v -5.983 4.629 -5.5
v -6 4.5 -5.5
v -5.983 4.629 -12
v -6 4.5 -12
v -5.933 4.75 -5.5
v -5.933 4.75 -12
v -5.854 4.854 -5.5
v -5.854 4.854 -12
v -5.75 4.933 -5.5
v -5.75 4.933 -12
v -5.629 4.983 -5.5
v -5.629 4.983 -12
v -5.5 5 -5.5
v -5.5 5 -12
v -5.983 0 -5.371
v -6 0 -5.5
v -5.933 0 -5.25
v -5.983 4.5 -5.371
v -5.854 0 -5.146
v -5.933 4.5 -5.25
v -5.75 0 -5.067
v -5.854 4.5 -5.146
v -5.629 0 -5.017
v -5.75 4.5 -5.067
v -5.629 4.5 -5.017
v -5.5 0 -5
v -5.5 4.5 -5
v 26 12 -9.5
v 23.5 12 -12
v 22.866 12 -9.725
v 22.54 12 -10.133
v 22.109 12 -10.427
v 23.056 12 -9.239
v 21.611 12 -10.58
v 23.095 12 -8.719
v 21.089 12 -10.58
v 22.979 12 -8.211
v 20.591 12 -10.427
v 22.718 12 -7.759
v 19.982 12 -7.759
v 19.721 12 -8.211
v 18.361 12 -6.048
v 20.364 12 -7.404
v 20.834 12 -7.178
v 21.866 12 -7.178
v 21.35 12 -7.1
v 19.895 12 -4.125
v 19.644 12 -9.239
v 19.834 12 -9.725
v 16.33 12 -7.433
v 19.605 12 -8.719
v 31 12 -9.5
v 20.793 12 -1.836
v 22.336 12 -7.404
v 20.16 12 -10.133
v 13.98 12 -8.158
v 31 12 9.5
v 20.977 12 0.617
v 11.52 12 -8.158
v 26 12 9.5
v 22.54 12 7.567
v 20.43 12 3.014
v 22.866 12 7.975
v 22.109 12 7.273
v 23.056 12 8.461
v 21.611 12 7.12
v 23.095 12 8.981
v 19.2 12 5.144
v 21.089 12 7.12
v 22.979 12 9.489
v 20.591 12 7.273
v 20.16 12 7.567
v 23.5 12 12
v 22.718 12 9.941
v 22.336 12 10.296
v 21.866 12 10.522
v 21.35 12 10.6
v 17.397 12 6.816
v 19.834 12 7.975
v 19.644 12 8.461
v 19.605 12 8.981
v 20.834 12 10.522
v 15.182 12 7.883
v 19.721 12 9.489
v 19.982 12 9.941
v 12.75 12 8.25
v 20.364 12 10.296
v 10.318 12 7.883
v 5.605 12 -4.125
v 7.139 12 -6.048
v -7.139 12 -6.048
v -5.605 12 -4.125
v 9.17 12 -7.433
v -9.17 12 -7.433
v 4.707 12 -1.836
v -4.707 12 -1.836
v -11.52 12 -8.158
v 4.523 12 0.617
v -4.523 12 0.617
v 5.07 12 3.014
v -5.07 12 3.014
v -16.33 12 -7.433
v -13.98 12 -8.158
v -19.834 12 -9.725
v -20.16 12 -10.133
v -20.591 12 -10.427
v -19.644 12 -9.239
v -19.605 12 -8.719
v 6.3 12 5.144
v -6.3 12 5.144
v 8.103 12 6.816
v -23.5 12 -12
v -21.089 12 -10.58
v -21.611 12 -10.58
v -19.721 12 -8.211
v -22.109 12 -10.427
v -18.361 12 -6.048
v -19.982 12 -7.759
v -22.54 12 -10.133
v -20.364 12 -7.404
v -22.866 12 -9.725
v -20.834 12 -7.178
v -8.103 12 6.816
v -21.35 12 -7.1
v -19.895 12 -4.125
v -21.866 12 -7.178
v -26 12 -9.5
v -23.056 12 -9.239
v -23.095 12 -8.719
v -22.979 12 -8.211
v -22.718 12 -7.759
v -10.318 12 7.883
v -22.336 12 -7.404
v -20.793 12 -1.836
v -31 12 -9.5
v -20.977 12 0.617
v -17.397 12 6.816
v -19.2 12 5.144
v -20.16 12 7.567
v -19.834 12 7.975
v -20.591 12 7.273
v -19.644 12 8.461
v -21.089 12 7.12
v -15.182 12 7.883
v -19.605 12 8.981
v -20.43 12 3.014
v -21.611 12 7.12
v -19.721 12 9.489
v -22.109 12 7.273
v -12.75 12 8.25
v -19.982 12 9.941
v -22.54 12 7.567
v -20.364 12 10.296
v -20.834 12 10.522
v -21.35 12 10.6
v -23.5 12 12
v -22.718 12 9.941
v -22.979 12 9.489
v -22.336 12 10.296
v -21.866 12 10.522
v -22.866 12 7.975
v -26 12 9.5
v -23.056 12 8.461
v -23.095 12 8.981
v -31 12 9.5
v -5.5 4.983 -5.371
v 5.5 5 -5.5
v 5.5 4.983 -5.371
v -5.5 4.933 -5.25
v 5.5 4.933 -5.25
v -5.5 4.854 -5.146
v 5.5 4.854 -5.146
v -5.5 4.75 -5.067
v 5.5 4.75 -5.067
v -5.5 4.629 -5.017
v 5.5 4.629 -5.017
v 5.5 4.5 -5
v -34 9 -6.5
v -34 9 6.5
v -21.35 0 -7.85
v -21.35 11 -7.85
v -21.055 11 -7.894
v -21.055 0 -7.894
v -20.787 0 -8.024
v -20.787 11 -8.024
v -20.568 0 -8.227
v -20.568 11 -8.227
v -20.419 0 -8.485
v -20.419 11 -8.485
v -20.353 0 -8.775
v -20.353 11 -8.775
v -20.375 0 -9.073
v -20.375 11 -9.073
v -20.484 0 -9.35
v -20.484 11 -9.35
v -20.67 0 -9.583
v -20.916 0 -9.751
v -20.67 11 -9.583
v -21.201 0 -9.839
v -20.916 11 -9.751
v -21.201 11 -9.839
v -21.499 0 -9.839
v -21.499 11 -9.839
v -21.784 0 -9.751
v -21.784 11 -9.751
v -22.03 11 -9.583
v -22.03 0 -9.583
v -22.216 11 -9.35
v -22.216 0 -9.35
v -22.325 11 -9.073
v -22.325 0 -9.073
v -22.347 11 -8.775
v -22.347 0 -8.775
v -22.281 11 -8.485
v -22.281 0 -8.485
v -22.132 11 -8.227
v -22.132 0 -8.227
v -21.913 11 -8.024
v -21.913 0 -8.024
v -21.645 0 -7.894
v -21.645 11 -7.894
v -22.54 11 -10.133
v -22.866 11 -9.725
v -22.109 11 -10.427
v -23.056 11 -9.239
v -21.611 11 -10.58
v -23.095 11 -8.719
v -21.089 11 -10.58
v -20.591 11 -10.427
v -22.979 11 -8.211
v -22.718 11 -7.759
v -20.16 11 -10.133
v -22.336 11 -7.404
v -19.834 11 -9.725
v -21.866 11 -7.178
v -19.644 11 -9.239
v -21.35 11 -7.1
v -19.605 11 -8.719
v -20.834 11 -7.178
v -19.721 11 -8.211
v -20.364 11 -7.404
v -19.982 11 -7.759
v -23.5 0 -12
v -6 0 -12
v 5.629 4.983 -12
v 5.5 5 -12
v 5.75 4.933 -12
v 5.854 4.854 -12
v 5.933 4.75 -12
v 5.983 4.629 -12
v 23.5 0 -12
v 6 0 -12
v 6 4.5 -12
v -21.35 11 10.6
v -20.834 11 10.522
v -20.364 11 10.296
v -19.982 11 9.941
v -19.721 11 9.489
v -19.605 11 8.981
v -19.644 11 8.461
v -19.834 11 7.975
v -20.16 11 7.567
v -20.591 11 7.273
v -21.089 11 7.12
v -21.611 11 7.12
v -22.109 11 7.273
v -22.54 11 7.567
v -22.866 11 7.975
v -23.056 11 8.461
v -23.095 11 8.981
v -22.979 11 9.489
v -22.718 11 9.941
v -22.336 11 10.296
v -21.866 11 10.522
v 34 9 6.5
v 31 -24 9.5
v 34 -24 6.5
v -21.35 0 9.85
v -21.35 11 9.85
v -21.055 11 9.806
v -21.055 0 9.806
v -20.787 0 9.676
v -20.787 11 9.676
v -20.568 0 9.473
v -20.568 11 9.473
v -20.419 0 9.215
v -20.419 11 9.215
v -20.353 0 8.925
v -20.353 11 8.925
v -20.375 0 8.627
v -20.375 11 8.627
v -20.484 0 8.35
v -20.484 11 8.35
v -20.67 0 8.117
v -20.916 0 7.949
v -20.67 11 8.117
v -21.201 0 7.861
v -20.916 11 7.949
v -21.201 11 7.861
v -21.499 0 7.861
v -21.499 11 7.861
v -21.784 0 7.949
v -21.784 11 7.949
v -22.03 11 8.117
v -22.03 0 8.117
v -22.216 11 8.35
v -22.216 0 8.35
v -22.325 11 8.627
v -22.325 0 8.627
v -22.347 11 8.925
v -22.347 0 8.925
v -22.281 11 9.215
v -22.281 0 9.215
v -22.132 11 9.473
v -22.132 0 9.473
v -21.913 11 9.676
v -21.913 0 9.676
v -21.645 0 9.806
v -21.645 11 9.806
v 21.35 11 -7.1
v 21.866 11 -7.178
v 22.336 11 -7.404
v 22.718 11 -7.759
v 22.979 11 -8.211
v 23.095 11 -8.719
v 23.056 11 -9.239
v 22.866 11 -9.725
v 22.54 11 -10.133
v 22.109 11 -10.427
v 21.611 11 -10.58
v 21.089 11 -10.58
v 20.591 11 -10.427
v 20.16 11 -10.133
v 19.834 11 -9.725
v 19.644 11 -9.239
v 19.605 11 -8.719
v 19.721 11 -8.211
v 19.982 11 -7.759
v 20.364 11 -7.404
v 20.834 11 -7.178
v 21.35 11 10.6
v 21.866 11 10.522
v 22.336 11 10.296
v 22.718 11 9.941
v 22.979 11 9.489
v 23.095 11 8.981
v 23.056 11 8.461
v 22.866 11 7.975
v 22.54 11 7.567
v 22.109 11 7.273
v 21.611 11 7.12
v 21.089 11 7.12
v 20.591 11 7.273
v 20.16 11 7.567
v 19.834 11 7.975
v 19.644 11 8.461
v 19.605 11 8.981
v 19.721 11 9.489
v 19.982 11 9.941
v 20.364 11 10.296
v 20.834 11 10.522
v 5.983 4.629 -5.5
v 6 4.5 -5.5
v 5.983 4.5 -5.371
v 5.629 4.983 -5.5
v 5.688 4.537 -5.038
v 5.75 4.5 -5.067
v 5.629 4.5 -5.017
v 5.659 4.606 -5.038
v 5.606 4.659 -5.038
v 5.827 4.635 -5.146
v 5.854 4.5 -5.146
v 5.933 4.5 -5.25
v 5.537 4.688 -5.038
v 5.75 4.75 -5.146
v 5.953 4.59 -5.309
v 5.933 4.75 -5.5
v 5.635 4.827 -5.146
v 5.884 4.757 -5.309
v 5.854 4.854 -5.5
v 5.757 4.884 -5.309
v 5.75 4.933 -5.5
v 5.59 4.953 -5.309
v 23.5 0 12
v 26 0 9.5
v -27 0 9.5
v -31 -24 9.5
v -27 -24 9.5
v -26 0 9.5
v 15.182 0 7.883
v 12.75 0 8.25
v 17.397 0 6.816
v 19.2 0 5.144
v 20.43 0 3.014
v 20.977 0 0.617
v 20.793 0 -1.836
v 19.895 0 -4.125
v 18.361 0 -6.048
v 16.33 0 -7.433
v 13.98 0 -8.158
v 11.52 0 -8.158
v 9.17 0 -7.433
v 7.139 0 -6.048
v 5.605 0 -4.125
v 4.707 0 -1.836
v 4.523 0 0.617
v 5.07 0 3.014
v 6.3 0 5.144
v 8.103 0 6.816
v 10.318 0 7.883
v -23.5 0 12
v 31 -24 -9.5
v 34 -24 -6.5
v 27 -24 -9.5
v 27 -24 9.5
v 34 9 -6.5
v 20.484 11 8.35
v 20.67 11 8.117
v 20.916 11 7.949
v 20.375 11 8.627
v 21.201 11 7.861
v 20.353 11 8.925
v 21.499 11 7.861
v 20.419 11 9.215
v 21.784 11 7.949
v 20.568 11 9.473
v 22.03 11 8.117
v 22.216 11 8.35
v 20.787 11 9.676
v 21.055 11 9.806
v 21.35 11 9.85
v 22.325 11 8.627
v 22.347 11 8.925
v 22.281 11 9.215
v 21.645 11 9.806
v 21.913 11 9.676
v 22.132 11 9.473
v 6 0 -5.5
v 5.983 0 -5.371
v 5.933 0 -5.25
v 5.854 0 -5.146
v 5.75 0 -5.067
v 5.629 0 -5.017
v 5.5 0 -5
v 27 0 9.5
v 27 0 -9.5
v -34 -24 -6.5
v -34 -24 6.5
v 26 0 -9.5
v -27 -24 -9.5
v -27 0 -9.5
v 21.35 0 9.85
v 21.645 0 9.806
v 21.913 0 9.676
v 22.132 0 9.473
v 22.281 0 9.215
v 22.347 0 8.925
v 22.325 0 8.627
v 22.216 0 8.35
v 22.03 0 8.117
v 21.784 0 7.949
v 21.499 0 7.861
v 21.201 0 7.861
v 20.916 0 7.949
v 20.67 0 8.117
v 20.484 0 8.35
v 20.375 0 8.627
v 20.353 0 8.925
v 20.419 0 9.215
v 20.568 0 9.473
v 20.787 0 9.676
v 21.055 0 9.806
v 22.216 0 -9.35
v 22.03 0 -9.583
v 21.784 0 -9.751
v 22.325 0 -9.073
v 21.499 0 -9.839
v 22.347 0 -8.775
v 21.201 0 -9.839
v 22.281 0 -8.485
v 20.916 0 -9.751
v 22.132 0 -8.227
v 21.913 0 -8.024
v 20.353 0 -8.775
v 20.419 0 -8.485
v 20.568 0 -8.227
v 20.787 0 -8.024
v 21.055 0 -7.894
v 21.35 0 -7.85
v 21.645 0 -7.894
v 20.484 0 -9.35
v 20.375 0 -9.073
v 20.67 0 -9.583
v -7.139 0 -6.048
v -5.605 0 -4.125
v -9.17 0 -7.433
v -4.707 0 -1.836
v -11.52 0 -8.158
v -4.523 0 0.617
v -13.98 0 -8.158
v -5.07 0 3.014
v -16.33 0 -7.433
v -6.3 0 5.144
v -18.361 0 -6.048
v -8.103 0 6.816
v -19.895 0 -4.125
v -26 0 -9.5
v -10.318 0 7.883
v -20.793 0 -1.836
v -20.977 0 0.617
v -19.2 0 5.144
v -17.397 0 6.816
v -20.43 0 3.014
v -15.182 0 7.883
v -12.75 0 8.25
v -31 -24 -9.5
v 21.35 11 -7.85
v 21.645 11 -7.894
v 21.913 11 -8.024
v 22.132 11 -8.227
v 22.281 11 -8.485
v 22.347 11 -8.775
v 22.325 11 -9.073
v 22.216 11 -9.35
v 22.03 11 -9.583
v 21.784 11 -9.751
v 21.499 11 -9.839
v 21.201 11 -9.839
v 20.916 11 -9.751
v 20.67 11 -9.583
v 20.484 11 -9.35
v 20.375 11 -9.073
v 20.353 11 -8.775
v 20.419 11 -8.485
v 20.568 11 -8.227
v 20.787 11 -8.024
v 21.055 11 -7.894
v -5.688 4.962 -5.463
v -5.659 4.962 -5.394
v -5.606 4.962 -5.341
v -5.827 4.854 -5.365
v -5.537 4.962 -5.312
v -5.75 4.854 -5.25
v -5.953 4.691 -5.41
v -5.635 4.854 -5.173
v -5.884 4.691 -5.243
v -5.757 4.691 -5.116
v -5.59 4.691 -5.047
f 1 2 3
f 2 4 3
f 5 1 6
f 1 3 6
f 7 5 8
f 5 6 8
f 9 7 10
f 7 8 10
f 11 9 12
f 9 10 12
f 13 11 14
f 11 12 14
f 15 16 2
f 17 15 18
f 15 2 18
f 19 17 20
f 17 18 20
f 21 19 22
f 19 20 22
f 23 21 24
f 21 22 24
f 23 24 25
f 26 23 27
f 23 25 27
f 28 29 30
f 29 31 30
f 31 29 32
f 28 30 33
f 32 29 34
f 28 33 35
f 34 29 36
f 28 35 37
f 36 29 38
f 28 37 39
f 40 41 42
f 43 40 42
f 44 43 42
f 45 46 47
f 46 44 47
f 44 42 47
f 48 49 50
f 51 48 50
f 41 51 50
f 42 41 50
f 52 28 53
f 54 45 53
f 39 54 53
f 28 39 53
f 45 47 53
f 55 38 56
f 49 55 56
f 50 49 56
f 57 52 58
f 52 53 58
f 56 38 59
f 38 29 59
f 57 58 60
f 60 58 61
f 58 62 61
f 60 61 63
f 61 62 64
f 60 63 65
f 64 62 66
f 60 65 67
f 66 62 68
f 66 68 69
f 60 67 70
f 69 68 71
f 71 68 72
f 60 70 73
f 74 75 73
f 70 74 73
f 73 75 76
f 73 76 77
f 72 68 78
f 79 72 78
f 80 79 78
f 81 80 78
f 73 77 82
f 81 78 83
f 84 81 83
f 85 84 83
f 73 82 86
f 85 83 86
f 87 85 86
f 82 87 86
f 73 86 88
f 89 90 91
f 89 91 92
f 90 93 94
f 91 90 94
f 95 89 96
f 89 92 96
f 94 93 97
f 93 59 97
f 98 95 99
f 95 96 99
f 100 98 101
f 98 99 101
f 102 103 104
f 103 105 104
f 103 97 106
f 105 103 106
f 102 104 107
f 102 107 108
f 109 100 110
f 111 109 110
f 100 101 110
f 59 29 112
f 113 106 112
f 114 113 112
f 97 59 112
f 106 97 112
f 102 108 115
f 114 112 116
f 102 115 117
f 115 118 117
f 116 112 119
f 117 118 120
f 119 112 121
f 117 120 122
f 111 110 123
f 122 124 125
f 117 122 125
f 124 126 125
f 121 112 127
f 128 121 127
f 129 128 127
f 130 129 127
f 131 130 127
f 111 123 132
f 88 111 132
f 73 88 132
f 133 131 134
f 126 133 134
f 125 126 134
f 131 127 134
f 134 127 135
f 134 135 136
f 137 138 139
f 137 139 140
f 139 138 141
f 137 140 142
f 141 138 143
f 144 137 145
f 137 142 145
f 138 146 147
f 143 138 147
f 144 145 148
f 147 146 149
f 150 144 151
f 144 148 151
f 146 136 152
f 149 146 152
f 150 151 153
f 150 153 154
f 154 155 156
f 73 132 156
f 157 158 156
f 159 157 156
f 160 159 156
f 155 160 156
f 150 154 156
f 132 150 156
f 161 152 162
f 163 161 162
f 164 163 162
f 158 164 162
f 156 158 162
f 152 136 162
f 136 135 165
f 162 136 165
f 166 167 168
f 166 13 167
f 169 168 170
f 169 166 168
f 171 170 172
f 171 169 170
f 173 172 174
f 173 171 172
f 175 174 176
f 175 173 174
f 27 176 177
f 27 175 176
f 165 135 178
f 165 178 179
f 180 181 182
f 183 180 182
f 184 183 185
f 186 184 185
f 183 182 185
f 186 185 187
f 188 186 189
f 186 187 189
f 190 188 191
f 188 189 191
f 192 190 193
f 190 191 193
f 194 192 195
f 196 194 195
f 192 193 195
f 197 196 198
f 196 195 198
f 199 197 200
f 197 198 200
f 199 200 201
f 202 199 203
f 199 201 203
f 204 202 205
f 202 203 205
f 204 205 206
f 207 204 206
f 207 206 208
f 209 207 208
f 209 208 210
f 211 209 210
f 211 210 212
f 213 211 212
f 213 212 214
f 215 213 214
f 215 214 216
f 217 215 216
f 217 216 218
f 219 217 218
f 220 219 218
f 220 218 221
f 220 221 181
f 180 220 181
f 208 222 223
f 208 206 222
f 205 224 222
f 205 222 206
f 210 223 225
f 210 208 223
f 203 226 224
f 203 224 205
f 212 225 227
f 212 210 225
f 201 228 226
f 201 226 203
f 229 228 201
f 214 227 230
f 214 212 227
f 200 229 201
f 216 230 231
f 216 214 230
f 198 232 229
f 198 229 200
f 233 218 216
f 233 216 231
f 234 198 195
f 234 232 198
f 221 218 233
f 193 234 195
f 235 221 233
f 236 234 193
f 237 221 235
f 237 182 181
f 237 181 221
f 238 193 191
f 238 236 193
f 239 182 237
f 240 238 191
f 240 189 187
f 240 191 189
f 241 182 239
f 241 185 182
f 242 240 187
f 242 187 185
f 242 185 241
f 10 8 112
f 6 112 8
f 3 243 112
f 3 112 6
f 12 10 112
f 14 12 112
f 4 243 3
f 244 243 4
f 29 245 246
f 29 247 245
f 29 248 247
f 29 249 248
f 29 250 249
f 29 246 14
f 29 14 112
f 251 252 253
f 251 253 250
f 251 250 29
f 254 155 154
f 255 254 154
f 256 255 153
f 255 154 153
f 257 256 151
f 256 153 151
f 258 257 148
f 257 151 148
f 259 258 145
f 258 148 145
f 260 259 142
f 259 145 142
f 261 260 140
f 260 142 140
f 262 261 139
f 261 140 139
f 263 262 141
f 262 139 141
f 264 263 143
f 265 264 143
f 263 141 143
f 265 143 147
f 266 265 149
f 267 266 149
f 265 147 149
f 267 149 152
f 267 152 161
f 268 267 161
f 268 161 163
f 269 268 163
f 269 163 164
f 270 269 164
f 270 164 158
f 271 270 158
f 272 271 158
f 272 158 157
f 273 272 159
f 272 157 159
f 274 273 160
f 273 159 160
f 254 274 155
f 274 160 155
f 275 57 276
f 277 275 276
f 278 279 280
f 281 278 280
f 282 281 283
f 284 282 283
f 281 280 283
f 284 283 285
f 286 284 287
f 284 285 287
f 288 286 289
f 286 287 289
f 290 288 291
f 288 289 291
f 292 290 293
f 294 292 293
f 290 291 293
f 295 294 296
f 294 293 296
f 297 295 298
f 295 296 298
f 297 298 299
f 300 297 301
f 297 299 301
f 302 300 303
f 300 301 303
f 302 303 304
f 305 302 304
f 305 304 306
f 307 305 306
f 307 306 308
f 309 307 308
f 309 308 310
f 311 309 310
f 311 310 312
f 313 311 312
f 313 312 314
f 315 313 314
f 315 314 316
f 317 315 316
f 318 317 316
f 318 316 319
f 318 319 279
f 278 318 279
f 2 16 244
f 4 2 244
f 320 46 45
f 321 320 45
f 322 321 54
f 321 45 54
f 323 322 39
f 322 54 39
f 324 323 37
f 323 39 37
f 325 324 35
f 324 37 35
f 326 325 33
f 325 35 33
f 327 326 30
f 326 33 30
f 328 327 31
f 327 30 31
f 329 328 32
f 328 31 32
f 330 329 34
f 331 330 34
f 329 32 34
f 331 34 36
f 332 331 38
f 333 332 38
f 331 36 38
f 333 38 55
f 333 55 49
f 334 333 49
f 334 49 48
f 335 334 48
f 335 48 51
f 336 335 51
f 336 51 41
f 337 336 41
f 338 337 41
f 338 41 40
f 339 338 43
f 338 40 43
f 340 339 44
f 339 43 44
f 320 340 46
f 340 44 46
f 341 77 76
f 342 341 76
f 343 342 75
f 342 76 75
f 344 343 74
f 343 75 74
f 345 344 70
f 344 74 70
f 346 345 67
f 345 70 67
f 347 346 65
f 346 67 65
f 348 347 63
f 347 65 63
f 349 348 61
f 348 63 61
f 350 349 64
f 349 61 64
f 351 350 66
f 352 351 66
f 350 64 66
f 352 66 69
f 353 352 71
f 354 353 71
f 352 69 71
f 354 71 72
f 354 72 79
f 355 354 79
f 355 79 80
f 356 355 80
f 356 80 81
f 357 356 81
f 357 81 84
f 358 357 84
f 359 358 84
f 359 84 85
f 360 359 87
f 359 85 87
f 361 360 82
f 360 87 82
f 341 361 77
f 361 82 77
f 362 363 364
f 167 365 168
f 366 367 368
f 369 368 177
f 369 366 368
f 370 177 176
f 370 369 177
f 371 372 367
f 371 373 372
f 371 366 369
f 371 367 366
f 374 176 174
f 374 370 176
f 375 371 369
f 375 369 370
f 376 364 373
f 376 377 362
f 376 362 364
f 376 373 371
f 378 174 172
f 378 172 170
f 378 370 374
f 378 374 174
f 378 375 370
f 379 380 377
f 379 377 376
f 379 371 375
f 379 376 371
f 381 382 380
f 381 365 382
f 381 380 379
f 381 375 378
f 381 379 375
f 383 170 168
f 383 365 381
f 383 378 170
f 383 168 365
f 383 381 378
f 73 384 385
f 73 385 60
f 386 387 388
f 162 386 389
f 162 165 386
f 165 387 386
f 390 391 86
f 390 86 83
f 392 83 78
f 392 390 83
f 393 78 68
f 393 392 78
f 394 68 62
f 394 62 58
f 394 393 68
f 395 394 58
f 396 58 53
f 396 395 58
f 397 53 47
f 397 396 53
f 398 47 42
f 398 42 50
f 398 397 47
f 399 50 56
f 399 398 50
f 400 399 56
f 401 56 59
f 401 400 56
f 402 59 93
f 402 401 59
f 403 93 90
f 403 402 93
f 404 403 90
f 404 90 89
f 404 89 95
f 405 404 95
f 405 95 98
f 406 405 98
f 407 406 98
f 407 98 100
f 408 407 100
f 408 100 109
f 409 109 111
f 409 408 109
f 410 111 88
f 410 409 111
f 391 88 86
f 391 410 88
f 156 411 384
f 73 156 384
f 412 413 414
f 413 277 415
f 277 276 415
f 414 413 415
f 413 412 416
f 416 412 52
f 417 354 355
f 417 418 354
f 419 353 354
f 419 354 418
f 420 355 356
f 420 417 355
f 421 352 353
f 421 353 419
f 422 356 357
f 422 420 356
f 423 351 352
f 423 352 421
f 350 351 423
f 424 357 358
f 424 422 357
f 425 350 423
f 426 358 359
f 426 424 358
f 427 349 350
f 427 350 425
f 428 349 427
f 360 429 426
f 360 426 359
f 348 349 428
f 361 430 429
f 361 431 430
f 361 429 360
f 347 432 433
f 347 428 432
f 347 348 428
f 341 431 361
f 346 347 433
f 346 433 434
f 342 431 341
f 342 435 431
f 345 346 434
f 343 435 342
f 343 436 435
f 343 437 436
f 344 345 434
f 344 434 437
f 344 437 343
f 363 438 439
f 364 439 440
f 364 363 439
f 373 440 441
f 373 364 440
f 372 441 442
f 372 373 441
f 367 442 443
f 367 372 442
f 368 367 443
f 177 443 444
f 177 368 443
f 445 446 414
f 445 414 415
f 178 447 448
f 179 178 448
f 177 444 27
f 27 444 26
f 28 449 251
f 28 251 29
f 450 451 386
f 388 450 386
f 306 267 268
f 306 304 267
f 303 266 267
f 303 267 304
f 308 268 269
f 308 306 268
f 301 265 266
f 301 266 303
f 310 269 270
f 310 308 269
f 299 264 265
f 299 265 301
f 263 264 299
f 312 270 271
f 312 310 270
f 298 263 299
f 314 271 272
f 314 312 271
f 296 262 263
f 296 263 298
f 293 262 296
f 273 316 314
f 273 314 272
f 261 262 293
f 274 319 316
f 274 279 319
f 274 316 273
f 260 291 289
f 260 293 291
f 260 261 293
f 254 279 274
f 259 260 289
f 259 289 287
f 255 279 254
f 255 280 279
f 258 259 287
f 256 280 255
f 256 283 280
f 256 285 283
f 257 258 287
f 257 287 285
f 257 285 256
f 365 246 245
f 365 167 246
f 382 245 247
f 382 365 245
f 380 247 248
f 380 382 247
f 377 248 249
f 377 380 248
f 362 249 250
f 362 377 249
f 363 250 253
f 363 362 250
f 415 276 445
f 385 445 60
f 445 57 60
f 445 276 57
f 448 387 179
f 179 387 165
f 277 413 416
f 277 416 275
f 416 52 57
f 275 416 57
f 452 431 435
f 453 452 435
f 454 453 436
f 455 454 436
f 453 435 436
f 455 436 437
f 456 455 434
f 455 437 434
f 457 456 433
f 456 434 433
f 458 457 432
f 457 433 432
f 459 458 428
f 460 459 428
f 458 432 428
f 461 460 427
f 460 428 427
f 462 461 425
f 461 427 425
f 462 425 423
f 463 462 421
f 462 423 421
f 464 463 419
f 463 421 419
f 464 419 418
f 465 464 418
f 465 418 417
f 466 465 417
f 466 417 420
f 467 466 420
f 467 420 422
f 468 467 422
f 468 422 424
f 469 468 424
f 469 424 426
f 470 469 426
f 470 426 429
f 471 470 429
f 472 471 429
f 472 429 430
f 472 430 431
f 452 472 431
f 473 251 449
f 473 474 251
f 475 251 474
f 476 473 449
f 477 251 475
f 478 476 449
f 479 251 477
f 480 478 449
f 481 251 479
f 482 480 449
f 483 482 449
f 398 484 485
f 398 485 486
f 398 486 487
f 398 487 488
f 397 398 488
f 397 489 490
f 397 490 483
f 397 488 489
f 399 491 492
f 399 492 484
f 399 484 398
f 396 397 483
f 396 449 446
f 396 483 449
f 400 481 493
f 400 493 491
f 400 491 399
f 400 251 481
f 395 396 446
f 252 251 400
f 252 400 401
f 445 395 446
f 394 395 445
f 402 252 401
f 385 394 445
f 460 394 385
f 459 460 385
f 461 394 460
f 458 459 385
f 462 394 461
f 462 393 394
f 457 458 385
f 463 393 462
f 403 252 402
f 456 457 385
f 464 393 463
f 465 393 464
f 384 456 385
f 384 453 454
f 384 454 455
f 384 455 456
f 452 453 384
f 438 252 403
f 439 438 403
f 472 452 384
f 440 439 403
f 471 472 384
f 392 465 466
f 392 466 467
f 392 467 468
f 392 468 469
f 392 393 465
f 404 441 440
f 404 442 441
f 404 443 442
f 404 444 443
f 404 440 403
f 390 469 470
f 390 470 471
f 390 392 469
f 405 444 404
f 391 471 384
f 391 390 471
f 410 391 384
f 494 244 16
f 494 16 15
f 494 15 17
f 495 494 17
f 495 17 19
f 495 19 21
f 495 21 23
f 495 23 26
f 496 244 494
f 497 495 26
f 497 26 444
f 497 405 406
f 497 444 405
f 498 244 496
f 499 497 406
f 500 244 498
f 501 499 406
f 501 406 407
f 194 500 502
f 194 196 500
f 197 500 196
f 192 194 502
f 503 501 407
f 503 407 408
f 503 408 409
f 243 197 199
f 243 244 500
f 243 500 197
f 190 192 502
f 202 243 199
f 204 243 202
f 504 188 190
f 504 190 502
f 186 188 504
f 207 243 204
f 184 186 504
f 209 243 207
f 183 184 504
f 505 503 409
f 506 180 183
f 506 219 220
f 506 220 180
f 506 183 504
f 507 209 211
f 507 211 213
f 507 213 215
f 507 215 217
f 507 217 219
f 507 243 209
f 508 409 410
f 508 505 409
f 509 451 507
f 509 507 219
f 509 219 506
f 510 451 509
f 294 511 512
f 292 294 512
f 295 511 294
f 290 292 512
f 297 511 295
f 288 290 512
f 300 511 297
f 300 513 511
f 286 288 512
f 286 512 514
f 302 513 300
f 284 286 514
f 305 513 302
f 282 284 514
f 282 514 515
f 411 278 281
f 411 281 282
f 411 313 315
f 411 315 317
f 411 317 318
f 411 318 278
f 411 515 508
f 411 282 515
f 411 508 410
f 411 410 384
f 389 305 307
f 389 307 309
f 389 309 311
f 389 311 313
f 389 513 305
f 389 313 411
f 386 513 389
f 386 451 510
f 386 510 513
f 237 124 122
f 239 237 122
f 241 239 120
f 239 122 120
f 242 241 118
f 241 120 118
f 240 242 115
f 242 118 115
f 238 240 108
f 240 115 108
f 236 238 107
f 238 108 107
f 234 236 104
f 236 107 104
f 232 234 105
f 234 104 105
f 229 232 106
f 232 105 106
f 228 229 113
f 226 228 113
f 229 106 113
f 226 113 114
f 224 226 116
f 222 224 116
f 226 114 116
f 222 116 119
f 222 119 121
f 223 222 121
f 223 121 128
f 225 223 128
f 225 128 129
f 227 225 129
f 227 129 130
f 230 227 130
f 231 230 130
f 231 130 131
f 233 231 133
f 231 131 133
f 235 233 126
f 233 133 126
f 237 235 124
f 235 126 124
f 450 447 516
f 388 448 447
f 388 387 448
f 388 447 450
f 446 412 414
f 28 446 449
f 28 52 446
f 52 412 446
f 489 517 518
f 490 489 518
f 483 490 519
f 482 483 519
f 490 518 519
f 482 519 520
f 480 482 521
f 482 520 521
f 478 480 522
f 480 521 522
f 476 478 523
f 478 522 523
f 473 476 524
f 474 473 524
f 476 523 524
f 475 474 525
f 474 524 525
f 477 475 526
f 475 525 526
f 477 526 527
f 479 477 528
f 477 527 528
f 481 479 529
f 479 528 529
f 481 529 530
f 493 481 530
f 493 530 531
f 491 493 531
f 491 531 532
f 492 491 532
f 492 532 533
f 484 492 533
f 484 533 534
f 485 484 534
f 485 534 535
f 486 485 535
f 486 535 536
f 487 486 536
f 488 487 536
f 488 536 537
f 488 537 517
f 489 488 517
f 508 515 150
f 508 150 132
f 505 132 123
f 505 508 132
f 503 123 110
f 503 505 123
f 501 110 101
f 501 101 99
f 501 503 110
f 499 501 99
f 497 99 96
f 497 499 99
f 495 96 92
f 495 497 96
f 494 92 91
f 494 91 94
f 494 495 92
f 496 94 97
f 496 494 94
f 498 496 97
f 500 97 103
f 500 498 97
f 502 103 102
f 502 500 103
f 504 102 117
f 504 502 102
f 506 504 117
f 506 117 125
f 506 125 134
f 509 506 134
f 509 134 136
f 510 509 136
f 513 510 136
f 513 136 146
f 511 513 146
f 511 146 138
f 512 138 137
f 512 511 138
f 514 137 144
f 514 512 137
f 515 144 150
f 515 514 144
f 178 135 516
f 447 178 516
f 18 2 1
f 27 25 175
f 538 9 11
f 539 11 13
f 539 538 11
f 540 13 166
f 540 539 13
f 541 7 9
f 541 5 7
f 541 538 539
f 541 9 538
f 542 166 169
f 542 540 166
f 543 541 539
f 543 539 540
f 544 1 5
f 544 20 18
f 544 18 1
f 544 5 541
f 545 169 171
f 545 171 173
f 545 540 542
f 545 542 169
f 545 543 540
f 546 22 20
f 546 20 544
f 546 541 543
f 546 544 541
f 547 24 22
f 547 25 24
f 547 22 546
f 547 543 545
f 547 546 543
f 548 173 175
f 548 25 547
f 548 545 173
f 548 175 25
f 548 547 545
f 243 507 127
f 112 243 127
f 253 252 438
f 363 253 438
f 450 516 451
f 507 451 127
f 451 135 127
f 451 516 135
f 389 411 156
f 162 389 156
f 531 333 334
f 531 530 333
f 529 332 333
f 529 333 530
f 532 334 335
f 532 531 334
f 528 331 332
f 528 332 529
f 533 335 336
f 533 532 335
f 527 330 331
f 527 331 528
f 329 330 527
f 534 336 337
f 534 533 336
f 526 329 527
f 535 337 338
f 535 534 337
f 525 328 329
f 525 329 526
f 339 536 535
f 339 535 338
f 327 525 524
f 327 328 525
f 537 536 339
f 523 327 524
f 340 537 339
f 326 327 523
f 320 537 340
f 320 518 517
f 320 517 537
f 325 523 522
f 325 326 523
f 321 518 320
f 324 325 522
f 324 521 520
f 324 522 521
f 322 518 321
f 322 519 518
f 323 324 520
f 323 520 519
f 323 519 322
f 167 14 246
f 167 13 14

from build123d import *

# Parameters (mm, degrees)
SKETCH1_W                = 52
SKETCH1_H                = 24
SKETCH1_R                = 8.25
BOSS_EXTRUDE1_DEPTH      = 12
SKETCH2_R                = 1
CUT_EXTRUDE1_DEPTH       = 32.048349393
SKETCH3_R                = 1.75
CUT_EXTRUDE2_DEPTH       = 1
CUT_EXTRUDE3_DEPTH       = 5
FILLET3_R                = 0.5
CHAMFER1_SIZE            = 2.5
SKETCH5_W                = 19
SKETCH5_H                = 12
BOSS_EXTRUDE2_DEPTH      = 8
SKETCH6_W                = 7
SKETCH6_H                = 19
BOSS_EXTRUDE3_DEPTH      = 24
CHAMFER2_SIZE            = 3
CHAMFER2_OF_MIRROR1_SIZE = 3


with BuildPart() as part:
    # Sketch1 → Boss-Extrude1 (new body)
    with BuildSketch(Plane(origin=(0, 0, 0), x_dir=(1, 0, 0), z_dir=(0, 1, 0))):
        Rectangle(SKETCH1_W, SKETCH1_H)
        with Locations(Location((12.75, 0, 0), (0, 0, 270))):
            Circle(SKETCH1_R, mode=Mode.SUBTRACT)
        with Locations(Location((-12.75, 0, 0), (0, 0, 270))):
            Circle(SKETCH1_R, mode=Mode.SUBTRACT)
    extrude(amount=BOSS_EXTRUDE1_DEPTH)

    # Sketch2 → Cut-Extrude1 (cut, through all)
    with BuildSketch(Plane(origin=(0, 12, 0), x_dir=(1, 0, 0), z_dir=(0, 1, 0))):
        with Locations(Location((-21.35, 8.85, 0), (0, 0, 270))):
            Circle(SKETCH2_R)
        with Locations(Location((21.35, 8.85, 0), (0, 0, 270))):
            Circle(SKETCH2_R)
        with Locations(Location((21.35, -8.85, 0), (0, 0, 270))):
            Circle(SKETCH2_R)
        with Locations(Location((-21.35, -8.85, 0), (0, 0, 270))):
            Circle(SKETCH2_R)
    extrude(amount=-CUT_EXTRUDE1_DEPTH, mode=Mode.SUBTRACT)

    # Sketch3 → Cut-Extrude2 (cut)
    with BuildSketch(Plane(origin=(0, 12, 0), x_dir=(1, 0, 0), z_dir=(0, 1, 0))):
        with Locations(Location((-21.35, 8.85, 0), (0, 0, 270))):
            Circle(SKETCH3_R)
        with Locations(Location((21.35, 8.85, 0), (0, 0, 270))):
            Circle(SKETCH3_R)
        with Locations(Location((21.35, -8.85, 0), (0, 0, 270))):
            Circle(SKETCH3_R)
        with Locations(Location((-21.35, -8.85, 0), (0, 0, 270))):
            Circle(SKETCH3_R)
    extrude(amount=-CUT_EXTRUDE2_DEPTH, mode=Mode.SUBTRACT)

    # Sketch4 → Cut-Extrude3 (cut)
    with BuildSketch(Plane.XZ):
        Polygon((-6, -5), (-6, -12), (6, -12), (6, -5), (0, -5), align=None)
    extrude(amount=-CUT_EXTRUDE3_DEPTH, mode=Mode.SUBTRACT)

    # Fillet3
    fillet3_edges = [part.edges().sort_by_distance(p)[0] for p in [
        (-6, 2.5, -5),
        (6, 5, -8.5),
        (6, 2.5, -5),
        (-6, 5, -8.5),
        (0, 5, -5),
    ]]
    fillet(fillet3_edges, radius=FILLET3_R)

    # Chamfer1
    chamfer1_edges = [part.edges().sort_by_distance(p)[0] for p in [
        (26, 6, 12),
        (-26, 6, 12),
        (-26, 6, -12),
        (26, 6, -12),
    ]]
    chamfer(chamfer1_edges, length=CHAMFER1_SIZE)

    # Sketch5 → Boss-Extrude2 (add)
    with BuildSketch(Plane.ZY.offset(26)):
        with Locations((0, 6)):
            Rectangle(SKETCH5_W, SKETCH5_H)
    boss_extrude2 = extrude(amount=BOSS_EXTRUDE2_DEPTH)

    # Sketch6 → Boss-Extrude3 (add)
    with BuildSketch(Plane.XZ):
        with Locations((-30.5, 0)):
            Rectangle(SKETCH6_W, SKETCH6_H)
    boss_extrude3 = extrude(amount=BOSS_EXTRUDE3_DEPTH)

    # Chamfer2
    chamfer2_edges = [part.edges().sort_by_distance(p)[0] for p in [
        (-34, -6, 9.5),
        (-34, 12, 0),
        (-34, -6, -9.5),
    ]]
    chamfer(chamfer2_edges, length=CHAMFER2_SIZE)

    # Mirror1: Boss-Extrude2, Boss-Extrude3 across plane
    add(boss_extrude2.mirror(Plane(origin=(0, 0, 0), x_dir=(0, 0, 1), z_dir=(1, 0, 0))))
    add(boss_extrude3.mirror(Plane(origin=(0, 0, 0), x_dir=(0, 0, 1), z_dir=(1, 0, 0))))

    # Chamfer2 of Mirror1
    chamfer2_of_mirror1_edges = [part.edges().sort_by_distance(p)[0] for p in [
        (34, -6, 9.5),
        (34, 12, 0),
        (34, -6, -9.5),
    ]]
    chamfer(chamfer2_of_mirror1_edges, length=CHAMFER2_OF_MIRROR1_SIZE)


solid = part.part
